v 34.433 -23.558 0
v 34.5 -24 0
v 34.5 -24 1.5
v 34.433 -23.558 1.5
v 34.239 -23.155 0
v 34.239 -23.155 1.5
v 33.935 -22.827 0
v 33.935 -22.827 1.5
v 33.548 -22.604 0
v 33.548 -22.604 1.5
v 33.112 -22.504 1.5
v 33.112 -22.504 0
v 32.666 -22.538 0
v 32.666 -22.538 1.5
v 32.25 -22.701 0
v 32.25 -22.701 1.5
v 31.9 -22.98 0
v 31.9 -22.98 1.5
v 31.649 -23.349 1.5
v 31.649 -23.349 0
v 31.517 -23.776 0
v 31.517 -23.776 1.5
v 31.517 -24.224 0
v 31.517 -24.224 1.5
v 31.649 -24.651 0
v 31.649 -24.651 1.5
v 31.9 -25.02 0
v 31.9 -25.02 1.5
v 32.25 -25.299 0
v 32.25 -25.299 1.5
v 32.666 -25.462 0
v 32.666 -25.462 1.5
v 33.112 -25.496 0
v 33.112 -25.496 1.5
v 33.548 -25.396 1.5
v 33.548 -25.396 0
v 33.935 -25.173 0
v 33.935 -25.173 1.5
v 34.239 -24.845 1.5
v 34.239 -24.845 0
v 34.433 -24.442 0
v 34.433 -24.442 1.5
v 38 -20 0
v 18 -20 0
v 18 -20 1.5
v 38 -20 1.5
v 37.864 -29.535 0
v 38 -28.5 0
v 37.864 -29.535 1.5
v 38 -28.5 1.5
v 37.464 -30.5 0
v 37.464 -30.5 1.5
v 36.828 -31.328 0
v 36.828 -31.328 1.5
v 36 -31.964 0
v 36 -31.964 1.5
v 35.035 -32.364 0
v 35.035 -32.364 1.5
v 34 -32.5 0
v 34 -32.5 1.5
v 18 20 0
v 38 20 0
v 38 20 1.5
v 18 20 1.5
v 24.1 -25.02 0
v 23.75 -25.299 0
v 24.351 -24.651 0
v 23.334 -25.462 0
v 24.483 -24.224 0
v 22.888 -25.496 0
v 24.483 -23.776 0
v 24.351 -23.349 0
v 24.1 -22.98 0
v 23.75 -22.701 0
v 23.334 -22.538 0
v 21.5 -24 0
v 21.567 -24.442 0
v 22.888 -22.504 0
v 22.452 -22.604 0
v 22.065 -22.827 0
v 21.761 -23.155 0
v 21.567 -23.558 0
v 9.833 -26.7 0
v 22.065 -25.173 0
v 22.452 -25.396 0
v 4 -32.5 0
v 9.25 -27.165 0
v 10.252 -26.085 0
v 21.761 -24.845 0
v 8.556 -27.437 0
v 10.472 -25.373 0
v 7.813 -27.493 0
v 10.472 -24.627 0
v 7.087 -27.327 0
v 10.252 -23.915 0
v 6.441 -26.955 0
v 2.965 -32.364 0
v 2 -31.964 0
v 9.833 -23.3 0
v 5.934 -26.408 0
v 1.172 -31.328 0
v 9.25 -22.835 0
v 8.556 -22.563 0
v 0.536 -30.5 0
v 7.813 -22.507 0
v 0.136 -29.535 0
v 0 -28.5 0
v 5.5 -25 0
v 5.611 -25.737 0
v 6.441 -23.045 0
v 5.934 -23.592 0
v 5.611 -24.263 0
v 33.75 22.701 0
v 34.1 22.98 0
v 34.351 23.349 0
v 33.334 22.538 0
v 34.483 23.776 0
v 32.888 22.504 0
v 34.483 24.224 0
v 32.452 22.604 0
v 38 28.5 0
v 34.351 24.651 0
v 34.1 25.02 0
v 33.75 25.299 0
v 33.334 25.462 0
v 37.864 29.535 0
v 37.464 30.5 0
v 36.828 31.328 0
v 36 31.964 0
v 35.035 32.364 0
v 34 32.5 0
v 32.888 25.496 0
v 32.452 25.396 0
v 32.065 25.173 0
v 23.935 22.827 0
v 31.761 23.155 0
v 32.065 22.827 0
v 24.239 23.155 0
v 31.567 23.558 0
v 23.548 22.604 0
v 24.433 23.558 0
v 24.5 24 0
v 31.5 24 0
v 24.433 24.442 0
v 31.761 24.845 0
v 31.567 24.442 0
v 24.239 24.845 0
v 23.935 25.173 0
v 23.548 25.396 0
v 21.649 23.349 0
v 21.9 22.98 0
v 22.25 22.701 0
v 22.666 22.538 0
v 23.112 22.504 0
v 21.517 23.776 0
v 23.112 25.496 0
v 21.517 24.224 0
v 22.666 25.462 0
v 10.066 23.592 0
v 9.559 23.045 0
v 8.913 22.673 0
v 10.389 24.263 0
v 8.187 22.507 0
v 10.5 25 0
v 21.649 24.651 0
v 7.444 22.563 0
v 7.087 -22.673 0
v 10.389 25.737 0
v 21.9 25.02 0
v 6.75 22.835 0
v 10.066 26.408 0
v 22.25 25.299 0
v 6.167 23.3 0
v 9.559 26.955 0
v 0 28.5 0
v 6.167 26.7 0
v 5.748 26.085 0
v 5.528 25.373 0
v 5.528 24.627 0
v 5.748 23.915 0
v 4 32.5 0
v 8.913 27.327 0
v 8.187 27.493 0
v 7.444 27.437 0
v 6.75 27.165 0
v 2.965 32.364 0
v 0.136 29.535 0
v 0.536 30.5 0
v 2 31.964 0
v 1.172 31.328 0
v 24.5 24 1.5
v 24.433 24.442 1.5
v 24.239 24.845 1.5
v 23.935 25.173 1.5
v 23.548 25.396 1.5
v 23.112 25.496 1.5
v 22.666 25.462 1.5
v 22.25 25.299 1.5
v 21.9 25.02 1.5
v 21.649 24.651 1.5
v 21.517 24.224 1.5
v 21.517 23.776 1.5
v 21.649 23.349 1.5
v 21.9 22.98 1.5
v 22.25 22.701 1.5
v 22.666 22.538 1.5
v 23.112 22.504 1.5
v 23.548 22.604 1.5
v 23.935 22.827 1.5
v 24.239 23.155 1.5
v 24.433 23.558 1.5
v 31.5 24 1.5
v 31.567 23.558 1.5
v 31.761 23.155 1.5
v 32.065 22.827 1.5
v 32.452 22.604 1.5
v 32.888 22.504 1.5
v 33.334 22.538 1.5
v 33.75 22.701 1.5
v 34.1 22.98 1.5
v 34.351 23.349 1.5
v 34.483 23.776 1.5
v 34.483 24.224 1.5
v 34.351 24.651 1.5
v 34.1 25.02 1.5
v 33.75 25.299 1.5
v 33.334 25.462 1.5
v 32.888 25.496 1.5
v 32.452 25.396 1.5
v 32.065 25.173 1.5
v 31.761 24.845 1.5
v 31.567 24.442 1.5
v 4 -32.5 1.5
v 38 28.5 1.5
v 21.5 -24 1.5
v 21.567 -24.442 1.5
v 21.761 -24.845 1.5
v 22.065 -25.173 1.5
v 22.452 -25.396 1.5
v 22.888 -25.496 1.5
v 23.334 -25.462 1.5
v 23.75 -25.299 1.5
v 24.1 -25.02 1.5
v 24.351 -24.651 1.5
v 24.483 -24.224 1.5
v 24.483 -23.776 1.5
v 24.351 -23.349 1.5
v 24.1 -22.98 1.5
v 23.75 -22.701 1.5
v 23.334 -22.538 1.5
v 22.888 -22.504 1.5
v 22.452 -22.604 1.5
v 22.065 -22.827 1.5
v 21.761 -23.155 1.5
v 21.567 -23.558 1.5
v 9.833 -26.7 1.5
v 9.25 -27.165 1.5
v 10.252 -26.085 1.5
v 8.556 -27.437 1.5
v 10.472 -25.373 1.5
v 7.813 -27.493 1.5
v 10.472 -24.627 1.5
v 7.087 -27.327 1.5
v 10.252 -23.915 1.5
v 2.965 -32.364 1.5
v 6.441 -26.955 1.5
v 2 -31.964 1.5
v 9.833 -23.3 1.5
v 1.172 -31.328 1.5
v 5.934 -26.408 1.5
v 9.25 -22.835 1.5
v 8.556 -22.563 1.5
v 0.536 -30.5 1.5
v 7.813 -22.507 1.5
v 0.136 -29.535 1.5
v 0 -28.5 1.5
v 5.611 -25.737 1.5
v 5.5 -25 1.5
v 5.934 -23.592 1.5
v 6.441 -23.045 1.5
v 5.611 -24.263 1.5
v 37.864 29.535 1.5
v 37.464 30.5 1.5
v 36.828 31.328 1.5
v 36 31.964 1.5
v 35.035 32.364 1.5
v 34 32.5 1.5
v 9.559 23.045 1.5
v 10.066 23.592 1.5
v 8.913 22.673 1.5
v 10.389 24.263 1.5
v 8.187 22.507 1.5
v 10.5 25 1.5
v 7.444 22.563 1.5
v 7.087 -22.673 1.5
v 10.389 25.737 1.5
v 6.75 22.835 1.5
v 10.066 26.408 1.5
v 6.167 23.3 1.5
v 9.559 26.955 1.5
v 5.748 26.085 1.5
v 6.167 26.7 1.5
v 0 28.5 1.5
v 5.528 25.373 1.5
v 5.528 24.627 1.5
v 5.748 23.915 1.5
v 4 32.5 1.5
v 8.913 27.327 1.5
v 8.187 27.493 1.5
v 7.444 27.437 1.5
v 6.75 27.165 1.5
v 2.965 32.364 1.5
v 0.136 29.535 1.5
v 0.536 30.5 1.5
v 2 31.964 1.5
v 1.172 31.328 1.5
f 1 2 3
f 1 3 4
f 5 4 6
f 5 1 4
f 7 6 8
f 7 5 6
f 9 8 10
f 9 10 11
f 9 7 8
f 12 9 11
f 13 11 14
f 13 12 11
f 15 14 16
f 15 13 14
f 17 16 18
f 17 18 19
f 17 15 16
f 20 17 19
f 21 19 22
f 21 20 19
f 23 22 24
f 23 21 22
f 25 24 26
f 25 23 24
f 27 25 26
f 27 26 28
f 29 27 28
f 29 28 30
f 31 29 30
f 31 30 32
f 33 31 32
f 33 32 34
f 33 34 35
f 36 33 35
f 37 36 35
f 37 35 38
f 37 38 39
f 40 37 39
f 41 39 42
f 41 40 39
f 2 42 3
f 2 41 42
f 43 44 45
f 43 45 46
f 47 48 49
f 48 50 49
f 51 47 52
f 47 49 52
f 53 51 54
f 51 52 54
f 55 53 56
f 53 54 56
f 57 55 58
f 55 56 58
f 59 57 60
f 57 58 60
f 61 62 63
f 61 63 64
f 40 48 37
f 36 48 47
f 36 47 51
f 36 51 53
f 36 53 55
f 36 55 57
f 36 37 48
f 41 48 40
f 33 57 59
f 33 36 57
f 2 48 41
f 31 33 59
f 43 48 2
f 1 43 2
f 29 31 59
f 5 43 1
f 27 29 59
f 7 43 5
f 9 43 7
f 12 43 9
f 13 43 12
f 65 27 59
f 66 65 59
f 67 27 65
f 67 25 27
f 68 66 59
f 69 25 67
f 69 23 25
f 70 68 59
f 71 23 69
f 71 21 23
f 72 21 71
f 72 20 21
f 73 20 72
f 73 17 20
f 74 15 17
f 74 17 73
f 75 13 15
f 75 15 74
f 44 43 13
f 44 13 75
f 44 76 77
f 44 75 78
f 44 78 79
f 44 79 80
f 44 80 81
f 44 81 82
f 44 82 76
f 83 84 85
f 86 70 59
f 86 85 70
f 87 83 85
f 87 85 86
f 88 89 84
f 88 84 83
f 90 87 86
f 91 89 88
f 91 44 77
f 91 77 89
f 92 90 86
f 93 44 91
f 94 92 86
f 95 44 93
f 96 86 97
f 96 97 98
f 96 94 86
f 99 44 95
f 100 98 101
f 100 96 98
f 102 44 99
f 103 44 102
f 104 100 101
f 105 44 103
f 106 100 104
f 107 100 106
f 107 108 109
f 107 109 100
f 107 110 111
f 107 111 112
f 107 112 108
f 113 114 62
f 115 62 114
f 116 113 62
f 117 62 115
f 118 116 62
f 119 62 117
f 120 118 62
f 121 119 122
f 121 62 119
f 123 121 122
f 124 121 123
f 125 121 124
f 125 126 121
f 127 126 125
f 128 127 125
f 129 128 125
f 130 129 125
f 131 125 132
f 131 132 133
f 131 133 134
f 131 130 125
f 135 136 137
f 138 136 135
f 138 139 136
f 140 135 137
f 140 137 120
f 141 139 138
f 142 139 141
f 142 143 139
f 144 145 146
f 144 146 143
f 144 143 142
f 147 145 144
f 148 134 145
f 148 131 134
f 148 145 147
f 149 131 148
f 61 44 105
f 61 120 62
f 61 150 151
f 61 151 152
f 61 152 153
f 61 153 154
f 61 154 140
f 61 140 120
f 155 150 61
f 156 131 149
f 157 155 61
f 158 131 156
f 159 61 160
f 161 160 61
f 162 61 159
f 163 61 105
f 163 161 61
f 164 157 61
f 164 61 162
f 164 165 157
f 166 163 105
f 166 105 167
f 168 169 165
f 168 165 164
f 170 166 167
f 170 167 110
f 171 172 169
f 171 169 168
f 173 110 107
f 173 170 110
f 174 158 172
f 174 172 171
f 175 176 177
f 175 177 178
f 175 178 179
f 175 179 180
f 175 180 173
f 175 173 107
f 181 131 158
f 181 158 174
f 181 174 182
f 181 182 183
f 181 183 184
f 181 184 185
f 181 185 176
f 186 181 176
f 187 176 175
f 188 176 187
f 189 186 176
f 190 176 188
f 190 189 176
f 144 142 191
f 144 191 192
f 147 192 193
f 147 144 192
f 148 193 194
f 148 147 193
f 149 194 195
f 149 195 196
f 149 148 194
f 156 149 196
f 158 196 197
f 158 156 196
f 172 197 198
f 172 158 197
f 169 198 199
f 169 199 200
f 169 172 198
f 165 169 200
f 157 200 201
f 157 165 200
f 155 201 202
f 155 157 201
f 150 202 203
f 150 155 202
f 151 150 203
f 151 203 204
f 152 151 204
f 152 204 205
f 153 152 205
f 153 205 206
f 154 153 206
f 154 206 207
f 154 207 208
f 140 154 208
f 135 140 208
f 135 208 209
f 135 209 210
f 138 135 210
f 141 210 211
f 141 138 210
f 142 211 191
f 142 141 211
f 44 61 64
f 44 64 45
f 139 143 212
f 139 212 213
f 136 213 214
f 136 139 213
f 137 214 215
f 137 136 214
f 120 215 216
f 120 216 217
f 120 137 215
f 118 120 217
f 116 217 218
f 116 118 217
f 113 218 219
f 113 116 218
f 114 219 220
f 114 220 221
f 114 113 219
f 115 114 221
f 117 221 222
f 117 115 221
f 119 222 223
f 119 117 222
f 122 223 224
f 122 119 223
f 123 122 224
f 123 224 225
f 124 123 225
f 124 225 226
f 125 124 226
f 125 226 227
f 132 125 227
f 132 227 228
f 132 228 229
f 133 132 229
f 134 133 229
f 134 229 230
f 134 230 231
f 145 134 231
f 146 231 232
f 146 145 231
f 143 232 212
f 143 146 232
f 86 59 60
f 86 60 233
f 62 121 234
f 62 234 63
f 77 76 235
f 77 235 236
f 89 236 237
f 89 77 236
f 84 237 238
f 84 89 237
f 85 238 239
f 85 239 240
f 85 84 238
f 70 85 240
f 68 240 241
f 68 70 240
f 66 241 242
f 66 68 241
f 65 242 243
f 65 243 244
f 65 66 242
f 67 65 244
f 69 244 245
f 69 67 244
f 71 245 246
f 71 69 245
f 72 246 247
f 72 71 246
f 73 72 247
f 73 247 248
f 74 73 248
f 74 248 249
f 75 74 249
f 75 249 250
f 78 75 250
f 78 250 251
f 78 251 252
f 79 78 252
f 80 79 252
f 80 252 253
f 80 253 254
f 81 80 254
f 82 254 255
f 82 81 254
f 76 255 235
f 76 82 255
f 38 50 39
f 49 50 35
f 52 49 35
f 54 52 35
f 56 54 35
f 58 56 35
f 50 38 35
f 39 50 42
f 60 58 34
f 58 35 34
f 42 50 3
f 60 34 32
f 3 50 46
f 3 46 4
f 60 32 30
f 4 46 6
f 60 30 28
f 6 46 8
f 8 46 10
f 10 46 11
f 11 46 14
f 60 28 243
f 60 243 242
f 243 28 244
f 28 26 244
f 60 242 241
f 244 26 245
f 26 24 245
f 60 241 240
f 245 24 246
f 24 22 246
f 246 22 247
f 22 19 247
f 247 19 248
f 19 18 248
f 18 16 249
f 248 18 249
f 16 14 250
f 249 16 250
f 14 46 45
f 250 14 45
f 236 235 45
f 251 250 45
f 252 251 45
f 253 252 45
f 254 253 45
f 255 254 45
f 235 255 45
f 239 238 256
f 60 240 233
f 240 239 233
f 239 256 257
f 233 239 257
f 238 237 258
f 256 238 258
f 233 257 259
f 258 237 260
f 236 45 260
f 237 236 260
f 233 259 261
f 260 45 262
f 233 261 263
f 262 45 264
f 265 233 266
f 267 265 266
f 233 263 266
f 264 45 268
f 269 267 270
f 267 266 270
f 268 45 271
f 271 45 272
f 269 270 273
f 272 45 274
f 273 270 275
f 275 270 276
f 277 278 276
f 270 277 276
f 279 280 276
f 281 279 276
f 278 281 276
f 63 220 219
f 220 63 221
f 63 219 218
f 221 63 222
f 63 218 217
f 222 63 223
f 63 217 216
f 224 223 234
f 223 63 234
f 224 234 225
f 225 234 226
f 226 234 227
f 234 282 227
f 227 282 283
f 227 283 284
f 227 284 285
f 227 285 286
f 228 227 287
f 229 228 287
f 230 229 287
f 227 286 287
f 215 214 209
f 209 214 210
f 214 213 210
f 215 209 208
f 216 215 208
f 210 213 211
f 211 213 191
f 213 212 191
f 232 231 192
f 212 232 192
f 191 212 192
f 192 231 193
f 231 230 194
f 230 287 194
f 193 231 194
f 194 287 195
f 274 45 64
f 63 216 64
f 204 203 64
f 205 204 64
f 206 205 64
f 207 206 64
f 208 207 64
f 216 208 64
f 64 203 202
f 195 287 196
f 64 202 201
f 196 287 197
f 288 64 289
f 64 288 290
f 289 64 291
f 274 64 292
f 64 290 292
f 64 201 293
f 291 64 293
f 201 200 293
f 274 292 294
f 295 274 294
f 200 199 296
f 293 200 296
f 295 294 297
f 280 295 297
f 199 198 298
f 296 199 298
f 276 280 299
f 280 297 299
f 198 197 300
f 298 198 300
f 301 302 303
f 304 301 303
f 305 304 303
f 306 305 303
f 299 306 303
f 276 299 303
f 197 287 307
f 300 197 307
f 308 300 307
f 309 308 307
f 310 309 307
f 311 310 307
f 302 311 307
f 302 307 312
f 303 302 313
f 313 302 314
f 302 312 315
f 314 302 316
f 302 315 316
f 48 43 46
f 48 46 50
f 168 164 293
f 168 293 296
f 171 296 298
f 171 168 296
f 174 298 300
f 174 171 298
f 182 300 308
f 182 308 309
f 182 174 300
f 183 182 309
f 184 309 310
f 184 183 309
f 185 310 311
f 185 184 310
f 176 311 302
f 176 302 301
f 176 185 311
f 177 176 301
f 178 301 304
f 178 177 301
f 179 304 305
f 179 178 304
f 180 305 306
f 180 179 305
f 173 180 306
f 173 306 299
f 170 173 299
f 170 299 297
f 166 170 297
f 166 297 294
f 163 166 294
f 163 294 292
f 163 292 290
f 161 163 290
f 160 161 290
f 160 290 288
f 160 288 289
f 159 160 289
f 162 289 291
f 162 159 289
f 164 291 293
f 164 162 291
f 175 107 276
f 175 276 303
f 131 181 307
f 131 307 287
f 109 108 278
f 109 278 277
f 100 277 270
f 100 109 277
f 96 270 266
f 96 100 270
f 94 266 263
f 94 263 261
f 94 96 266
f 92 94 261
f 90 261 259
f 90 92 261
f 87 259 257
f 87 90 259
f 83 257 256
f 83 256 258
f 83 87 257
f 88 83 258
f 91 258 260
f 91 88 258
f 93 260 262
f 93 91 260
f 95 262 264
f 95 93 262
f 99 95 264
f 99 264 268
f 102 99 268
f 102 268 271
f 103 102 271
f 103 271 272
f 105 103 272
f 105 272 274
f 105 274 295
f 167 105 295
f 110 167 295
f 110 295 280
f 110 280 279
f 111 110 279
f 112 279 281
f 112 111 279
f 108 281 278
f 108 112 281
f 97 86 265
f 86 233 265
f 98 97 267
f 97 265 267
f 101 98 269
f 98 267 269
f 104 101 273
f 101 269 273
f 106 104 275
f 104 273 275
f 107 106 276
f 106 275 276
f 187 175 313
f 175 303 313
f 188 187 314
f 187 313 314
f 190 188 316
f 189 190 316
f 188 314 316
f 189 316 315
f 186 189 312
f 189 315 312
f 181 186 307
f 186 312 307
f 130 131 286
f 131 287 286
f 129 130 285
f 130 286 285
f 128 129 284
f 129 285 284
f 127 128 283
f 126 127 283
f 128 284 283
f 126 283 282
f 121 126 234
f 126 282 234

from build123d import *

# Parameters (mm, degrees)
ESQUISSE1_R        = 2.5
ESQUISSE1_R_2      = 1.5
BOSS_EXTRU_1_DEPTH = 1.5
CONG_1_R           = 4


with BuildPart() as part:
    # Esquisse1 → Boss.-Extru.1 (new body)
    with BuildSketch(Plane.XY):
        Polygon((38, -20), (38, -32.5), (0, -32.5), (0, 32.5), (38, 32.5), (38, 20), (18, 20), (18, -20), align=None)
        with Locations((8, 25)):
            Circle(ESQUISSE1_R, mode=Mode.SUBTRACT)
        with Locations((23, 24)):
            Circle(ESQUISSE1_R_2, mode=Mode.SUBTRACT)
        with Locations(Location((33, 24, 0), (0, 0, 180))):
            Circle(ESQUISSE1_R_2, mode=Mode.SUBTRACT)
        with Locations((33, -24)):
            Circle(ESQUISSE1_R_2, mode=Mode.SUBTRACT)
        with Locations(Location((23, -24, 0), (0, 0, 180))):
            Circle(ESQUISSE1_R_2, mode=Mode.SUBTRACT)
        with Locations(Location((8, -25, 0), (0, 0, 180))):
            Circle(ESQUISSE1_R, mode=Mode.SUBTRACT)
    extrude(amount=BOSS_EXTRU_1_DEPTH)

    # Congé1
    cong_1_edges = [part.edges().sort_by_distance(p)[0] for p in [
        (38, -32.5, 0.75),
        (0, -32.5, 0.75),
        (0, 32.5, 0.75),
        (38, 32.5, 0.75),
    ]]
    fillet(cong_1_edges, radius=CONG_1_R)


solid = part.part
